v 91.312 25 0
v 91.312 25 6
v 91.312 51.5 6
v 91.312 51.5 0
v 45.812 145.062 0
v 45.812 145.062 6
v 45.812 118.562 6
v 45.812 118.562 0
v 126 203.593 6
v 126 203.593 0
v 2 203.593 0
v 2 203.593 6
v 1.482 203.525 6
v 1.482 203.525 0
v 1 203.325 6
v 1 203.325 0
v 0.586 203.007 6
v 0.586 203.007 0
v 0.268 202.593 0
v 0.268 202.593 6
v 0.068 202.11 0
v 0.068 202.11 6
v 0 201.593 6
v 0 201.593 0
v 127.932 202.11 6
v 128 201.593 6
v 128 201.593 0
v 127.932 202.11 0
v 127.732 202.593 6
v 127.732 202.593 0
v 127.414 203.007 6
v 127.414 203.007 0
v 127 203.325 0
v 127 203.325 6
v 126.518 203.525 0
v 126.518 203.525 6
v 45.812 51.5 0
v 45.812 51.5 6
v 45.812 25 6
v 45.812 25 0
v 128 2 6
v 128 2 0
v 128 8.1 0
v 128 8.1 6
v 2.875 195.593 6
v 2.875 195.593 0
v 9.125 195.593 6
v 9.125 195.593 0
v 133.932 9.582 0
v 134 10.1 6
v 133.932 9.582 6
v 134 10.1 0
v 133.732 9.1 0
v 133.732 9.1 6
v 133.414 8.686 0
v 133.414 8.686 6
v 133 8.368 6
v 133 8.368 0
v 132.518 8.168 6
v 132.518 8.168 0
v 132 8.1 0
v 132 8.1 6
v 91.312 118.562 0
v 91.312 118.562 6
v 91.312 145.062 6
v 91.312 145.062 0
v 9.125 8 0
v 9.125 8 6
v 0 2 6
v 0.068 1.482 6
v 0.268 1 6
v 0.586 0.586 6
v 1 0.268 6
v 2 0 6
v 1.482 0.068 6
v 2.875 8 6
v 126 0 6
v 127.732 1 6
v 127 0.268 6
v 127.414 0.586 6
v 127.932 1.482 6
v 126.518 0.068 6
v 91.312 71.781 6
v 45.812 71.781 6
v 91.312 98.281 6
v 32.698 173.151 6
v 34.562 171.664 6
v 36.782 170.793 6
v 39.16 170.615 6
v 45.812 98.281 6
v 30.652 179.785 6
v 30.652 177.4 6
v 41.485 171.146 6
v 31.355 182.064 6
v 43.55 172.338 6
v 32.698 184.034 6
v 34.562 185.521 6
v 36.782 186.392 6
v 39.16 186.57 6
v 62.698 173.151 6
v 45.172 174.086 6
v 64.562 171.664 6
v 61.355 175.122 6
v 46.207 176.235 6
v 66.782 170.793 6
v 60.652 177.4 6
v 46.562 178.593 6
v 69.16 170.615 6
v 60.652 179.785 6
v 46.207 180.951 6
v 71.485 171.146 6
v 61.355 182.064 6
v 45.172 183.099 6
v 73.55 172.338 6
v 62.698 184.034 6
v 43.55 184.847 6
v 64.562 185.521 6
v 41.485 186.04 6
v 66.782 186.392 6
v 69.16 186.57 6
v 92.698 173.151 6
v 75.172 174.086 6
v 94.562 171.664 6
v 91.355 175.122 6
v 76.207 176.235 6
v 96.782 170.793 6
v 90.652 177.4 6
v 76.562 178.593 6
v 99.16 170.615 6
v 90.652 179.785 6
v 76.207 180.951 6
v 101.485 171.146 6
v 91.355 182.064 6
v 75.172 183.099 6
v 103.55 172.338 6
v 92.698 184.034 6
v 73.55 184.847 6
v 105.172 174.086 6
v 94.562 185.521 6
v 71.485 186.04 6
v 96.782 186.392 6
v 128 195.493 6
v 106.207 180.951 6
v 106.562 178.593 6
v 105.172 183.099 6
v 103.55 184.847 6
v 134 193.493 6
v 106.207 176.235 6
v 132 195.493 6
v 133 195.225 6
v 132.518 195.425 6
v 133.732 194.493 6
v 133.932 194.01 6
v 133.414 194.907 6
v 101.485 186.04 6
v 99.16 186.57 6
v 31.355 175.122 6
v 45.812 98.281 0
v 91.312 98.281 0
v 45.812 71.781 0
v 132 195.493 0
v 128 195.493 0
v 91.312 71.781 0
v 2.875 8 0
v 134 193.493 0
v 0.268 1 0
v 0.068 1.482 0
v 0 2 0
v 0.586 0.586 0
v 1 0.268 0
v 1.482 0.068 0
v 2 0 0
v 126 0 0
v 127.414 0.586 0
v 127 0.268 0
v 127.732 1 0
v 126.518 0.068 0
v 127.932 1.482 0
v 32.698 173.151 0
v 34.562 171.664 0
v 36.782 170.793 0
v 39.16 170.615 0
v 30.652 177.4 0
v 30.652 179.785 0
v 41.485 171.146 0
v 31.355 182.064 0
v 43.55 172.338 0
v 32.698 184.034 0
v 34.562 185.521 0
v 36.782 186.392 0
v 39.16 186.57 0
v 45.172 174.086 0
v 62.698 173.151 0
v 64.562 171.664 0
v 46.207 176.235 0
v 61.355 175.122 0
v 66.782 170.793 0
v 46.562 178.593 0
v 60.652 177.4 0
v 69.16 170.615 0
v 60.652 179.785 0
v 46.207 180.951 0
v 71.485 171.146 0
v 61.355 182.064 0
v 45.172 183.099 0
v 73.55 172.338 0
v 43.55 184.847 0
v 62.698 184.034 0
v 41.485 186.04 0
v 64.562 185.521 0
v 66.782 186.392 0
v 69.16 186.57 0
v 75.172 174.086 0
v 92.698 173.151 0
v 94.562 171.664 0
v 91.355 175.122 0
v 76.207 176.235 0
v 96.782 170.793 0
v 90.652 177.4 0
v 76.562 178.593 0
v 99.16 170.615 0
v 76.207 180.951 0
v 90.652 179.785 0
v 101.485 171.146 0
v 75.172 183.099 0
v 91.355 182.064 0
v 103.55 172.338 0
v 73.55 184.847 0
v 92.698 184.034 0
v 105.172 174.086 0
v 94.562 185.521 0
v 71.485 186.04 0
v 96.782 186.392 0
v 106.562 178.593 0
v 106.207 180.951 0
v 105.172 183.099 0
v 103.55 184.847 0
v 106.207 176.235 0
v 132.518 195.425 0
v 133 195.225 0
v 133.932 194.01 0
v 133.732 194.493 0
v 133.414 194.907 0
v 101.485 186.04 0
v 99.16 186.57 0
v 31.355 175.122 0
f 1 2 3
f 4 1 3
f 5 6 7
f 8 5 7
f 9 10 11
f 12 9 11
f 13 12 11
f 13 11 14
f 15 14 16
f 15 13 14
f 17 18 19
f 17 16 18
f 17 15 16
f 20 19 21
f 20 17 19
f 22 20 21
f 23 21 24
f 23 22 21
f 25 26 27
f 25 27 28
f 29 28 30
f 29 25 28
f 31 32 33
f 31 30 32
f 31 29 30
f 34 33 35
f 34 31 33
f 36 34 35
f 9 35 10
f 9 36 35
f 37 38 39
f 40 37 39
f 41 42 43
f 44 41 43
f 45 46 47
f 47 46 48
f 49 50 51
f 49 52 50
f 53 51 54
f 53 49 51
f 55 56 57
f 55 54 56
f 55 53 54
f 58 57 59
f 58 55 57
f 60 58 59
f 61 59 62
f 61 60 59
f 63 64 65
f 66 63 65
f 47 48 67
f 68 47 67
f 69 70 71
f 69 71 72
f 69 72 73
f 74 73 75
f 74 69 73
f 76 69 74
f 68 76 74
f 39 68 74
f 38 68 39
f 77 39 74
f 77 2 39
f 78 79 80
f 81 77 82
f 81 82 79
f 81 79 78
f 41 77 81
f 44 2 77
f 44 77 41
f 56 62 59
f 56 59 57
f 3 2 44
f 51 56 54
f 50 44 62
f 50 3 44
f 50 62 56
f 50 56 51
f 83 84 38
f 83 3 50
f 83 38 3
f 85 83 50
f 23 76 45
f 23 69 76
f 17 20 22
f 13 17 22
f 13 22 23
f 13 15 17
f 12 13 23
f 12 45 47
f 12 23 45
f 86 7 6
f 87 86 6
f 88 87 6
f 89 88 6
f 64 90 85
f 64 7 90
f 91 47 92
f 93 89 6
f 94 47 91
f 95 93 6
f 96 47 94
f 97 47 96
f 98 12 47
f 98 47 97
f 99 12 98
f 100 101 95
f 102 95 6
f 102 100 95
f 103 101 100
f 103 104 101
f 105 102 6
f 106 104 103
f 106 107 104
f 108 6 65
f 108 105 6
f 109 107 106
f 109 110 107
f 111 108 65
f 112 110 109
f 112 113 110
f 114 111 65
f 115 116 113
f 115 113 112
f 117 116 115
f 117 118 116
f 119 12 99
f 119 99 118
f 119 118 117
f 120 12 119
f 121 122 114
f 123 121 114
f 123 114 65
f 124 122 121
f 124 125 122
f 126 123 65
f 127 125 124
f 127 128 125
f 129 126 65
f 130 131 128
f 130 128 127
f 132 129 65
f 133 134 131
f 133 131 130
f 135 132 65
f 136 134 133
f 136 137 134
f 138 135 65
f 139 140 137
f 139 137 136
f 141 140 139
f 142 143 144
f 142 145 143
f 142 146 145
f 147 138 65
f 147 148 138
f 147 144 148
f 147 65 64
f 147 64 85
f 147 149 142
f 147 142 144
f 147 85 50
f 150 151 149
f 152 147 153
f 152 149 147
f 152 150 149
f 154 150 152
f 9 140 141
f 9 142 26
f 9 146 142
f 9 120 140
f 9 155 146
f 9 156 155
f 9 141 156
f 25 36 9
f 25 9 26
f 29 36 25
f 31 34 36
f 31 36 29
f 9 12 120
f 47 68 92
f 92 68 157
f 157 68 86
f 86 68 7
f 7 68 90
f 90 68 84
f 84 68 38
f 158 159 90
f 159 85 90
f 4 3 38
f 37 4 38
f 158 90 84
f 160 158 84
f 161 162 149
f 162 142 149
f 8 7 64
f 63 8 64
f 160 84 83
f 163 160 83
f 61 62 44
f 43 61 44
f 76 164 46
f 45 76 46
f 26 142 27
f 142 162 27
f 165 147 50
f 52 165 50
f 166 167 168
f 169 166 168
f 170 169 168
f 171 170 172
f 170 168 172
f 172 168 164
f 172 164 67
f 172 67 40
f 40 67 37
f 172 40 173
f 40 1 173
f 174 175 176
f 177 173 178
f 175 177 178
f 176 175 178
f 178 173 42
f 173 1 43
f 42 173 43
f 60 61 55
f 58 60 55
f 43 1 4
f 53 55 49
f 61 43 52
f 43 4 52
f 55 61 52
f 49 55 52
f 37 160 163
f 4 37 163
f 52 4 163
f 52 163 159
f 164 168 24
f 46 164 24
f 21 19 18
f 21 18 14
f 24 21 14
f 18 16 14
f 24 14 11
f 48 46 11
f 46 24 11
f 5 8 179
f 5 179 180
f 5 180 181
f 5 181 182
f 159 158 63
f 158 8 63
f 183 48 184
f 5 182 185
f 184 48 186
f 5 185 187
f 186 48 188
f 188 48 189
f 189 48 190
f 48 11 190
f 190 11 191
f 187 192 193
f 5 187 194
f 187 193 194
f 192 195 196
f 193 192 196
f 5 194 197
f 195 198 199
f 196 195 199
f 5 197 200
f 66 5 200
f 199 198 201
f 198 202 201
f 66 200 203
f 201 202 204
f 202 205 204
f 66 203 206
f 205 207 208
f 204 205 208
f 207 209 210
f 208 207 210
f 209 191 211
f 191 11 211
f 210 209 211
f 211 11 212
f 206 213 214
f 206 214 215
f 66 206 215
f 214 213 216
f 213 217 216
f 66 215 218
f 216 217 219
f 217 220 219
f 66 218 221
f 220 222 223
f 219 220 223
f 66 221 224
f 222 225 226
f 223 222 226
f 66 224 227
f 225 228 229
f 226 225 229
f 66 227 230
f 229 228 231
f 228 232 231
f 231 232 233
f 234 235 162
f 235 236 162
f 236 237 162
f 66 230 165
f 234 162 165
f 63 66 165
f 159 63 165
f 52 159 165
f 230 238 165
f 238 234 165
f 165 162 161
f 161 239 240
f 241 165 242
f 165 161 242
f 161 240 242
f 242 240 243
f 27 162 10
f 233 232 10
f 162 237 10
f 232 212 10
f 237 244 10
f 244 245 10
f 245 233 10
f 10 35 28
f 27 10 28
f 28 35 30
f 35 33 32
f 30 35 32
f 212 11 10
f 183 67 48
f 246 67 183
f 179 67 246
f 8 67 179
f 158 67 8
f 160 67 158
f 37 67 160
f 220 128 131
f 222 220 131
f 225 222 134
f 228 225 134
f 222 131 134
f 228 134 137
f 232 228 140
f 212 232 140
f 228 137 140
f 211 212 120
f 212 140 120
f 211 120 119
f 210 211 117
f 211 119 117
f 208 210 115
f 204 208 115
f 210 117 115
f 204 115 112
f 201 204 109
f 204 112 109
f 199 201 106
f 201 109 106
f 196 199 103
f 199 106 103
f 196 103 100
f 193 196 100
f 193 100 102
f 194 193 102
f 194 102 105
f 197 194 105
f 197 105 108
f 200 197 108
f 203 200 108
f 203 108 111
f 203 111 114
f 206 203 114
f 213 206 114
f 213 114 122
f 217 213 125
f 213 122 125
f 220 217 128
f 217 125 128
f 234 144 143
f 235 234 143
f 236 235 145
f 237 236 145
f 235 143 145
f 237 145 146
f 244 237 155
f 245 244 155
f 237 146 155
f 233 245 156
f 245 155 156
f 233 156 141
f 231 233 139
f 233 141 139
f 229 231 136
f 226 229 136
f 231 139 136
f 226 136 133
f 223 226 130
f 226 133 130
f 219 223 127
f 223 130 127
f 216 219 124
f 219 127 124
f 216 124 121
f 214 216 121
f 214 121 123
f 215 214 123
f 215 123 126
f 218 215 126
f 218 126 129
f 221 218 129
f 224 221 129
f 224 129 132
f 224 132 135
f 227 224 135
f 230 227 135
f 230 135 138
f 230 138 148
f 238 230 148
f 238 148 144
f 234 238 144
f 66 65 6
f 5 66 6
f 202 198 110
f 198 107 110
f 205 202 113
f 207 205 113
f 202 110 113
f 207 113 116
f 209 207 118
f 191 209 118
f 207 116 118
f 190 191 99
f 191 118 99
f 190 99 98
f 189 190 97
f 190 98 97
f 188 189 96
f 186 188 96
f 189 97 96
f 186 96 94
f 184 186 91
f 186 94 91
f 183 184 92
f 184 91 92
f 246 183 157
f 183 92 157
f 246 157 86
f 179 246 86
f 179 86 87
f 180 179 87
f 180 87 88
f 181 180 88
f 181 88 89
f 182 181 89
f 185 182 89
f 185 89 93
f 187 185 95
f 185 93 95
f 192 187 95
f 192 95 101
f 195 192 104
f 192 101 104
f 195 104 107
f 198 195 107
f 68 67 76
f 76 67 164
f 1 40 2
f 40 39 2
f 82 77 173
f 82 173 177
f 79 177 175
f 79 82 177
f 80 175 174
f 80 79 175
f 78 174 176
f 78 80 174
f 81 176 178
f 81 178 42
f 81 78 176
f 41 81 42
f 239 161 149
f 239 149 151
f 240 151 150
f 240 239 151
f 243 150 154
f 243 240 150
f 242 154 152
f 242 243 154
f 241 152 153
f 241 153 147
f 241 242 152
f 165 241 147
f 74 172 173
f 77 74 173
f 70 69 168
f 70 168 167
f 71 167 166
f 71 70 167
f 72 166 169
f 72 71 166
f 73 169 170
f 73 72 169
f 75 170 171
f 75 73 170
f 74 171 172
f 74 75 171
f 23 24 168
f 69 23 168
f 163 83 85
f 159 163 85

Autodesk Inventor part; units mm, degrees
ref_plane "YZ Plane" through (0, 0, 0) normal (1, 0, 0) x (0, 1, 0)
ref_plane "XZ Plane" through (0, 0, 0) normal (0, 1, 0) x (-1, 0, 0)
ref_plane "XY Plane" through (0, 0, 0) normal (0, 0, 1) x (1, 0, 0)
sketch "Sketch1" plane through (0, 0, 0) normal (0, 0, 1) x (1, 0, 0)
  line L0 (0, 0) -> (128, 0)
  line L1 (128, 0) -> (128, 203.5927)
  line L2 (128, 203.5927) -> (0, 203.5927)
  line L3 (0, 203.5927) -> (0, 0)
  line L4 (0, 0) -> (-77.2375, 168.1052) construction
  line L5 (-77.2375, 168.1052) -> (0, 203.5927) construction
  line L6 (2.875, 195.5927) -> (9.125, 195.5927)
  line L7 (9.125, 195.5927) -> (9.125, 8)
  line L8 (9.125, 8) -> (2.875, 8)
  line L9 (2.875, 8) -> (2.875, 195.5927)
  dimension "d0" = 128
  dimension "d1" = 85
  dimension "d2" = 185
  dimension "d3" = 6.25
  dimension "d4" = 2.875
  dimension "d5" = 8
  dimension "d6" = 8
extrude "Extrusion1" add sketch "Sketch1" along normal blind 6
sketch "Sketch2" plane through (0, 0, 6) normal (0, 0, 1) x (1, 0, 0)
  line L0 (0, 0) -> (128, 0) projected
  line L1 (128, 0) -> (128, 203.5927) projected
  line L2 (128, 203.5927) -> (0, 203.5927) projected
  line L3 (128, 195.4927) -> (134, 195.4927)
  line L4 (134, 195.4927) -> (134, 8.1)
  line L5 (134, 8.1) -> (128, 8.1)
  line L6 (128, 8.1) -> (128, 195.4927)
  dimension "d9" = 8.1
  dimension "d10" = 8.1
  dimension "d11" = 6
extrude "Extrusion2" add sketch "Sketch2" against normal blind 6
fillet "Fillet1" radius 2 6 edges at (134, 195.4927, 3) (128, 203.5927, 3) (0, 203.5927, 3) (128, 0, 3) (134, 8.1, 3) (0, 0, 3)
sketch "Sketch3" plane through (0, 0, 6) normal (0, 0, 1) x (1, 0, 0)
  line L0 (9.125, 195.5927) -> (9.125, 8) projected
  line L1 (2, 0) -> (126, 0) projected
  line L2 (128, 195.4927) -> (128, 201.5927) projected
  line L3 (126, 203.5927) -> (2, 203.5927) projected
  circle A0 centre (38.5625, 178.5927) radius 8
  circle A1 centre (68.5625, 178.5927) radius 8
  circle A2 centre (98.5625, 178.5927) radius 8
  line L4 (45.8125, 118.5618) -> (91.3125, 118.5618)
  line L5 (91.3125, 118.5618) -> (91.3125, 145.0618)
  line L6 (91.3125, 145.0618) -> (45.8125, 145.0618)
  line L7 (45.8125, 145.0618) -> (45.8125, 118.5618)
  line L8 (45.8125, 118.5618) -> (91.3125, 145.0618) construction
  line L9 (91.3125, 118.5618) -> (45.8125, 145.0618) construction
  line L10 (45.8125, 71.7809) -> (91.3125, 71.7809)
  line L11 (91.3125, 71.7809) -> (91.3125, 98.2809)
  line L12 (91.3125, 98.2809) -> (45.8125, 98.2809)
  line L13 (45.8125, 98.2809) -> (45.8125, 71.7809)
  line L14 (45.8125, 71.7809) -> (91.3125, 98.2809) construction
  line L15 (91.3125, 71.7809) -> (45.8125, 98.2809) construction
  line L16 (45.8125, 25) -> (91.3125, 25)
  line L17 (91.3125, 25) -> (91.3125, 51.5)
  line L18 (91.3125, 51.5) -> (45.8125, 51.5)
  line L19 (45.8125, 51.5) -> (45.8125, 25)
  line L20 (45.8125, 25) -> (91.3125, 51.5) construction
  line L21 (91.3125, 25) -> (45.8125, 51.5) construction
  line L22 (68.5625, 178.5927) -> (68.5625, 131.8118) construction
  line L23 (68.5625, 131.8118) -> (68.5625, 85.0309) construction
  line L24 (68.5625, 85.0309) -> (68.5625, 38.25) construction
  point P0 (0, 0)
  dimension "d15" = 16
  dimension "d16" = 26.5
  dimension "d17" = 45.5
  dimension "d18" = 118.875
  dimension "d19" = 59.4375
  dimension "d20" = 30
  dimension "d21" = 30
  dimension "d22" = 25
  dimension "d23" = 25
extrude "Extrusion3" cut sketch "Sketch3" against normal blind 10
equation "\"d19\" = 0.5 * d18"
equation "\"d21\" = d20"
properties part number "NewControlPanel"
